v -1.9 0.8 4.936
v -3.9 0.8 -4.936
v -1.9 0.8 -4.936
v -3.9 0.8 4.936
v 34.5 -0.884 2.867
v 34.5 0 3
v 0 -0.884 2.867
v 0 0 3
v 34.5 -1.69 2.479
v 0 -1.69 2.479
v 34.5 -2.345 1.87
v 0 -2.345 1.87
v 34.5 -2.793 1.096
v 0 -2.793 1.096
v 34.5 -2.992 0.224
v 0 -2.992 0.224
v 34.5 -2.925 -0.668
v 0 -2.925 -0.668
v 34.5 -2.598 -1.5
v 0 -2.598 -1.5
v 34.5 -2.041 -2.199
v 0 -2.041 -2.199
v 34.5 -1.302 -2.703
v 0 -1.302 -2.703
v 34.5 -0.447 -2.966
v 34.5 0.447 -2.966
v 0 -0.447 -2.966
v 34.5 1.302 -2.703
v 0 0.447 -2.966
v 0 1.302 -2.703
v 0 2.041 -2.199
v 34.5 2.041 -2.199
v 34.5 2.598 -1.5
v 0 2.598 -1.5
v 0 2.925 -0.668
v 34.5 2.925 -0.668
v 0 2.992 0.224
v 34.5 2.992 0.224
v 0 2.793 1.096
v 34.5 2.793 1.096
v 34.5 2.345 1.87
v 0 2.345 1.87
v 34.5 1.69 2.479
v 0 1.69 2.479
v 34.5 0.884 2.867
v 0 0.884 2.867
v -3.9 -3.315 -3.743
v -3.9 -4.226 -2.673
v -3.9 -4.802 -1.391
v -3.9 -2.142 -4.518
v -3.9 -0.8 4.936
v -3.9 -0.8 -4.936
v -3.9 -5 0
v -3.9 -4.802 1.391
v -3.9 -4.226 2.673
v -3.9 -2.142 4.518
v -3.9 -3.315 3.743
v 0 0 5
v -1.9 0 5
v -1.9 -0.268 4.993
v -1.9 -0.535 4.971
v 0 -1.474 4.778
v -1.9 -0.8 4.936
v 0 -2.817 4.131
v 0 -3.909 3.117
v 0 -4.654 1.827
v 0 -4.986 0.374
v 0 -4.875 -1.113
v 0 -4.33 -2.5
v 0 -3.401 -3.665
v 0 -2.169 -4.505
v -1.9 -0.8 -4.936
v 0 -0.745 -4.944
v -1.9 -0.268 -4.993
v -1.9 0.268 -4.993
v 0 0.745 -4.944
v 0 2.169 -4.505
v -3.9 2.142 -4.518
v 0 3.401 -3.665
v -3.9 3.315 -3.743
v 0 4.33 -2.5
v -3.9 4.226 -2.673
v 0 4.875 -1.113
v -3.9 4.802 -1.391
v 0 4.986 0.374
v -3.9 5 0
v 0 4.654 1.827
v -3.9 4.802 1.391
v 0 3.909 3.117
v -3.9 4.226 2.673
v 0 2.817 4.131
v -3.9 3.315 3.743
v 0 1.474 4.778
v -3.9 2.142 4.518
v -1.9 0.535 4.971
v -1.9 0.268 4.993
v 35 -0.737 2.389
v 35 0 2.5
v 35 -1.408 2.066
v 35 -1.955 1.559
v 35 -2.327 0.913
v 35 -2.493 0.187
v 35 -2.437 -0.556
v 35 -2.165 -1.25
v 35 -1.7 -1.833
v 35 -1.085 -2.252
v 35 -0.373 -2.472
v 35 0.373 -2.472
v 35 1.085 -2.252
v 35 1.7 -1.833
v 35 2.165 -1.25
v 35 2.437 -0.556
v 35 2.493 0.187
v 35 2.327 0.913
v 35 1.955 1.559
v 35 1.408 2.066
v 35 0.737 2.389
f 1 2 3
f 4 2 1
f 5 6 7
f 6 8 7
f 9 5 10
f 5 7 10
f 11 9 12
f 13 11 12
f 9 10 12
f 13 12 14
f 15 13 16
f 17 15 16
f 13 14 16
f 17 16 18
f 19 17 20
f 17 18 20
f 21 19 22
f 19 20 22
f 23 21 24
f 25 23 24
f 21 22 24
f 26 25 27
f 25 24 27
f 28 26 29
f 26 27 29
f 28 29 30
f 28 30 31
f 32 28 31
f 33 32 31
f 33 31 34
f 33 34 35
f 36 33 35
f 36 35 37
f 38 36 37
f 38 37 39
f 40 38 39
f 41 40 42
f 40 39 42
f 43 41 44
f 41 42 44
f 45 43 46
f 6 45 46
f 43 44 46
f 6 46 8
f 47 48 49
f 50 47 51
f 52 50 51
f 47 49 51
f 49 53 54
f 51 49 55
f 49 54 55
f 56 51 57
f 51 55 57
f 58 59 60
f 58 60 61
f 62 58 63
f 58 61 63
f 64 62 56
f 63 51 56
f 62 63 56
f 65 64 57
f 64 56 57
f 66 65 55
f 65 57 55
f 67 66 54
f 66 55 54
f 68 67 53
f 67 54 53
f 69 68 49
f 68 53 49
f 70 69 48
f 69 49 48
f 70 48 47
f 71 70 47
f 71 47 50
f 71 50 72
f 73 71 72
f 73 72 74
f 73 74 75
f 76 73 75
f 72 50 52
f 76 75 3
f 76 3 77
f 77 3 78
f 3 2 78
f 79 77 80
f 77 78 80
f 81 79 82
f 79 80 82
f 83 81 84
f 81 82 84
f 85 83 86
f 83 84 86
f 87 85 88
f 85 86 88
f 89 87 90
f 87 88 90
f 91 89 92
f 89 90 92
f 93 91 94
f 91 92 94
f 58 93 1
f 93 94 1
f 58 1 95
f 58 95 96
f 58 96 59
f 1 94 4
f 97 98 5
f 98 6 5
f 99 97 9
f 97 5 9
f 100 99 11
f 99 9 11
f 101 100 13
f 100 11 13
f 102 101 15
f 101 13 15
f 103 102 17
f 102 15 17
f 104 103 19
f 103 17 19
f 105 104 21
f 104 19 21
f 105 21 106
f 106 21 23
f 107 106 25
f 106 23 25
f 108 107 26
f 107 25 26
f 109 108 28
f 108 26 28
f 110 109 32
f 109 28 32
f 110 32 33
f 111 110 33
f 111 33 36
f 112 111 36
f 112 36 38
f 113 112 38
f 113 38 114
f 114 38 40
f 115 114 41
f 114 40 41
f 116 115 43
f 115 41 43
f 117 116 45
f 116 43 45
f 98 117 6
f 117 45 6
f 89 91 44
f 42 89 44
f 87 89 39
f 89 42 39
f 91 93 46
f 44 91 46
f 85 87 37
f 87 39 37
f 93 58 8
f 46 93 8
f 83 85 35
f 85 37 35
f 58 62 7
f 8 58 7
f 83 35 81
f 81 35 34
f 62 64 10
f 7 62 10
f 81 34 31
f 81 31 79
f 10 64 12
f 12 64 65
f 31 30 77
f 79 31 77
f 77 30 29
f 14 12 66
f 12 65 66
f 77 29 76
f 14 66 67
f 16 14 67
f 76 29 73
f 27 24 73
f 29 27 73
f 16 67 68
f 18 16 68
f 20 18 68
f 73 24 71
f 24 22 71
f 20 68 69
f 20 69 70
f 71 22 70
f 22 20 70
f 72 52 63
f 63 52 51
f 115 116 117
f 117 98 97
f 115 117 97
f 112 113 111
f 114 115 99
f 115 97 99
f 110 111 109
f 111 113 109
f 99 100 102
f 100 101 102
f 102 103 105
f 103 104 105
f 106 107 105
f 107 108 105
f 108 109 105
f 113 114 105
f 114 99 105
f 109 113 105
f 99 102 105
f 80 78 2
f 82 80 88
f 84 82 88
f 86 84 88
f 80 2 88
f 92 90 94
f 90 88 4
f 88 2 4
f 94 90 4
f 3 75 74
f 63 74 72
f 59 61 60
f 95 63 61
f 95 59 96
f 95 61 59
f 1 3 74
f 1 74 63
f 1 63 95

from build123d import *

# Parameters (mm, degrees)
ESQUISSE2_W             = 12
ESQUISSE2_H             = 1.6
ENL_V_MAT_EXTRU_1_DEPTH = 2


with BuildPart() as part:
    # Esquisse1 → Révolution1 (revolve)
    with BuildSketch(Plane.XY, mode=Mode.PRIVATE) as r_volution1_sk:
        Polygon((0, 3), (0, 5), (-3.9, 5), (-3.9, 0), (35, 0), (35, 2.5), (34.5, 3), align=None)
    revolve(r_volution1_sk.sketch.rotate(Axis((-3.9, 0, 0), (1, 0, 0)), 90), axis=Axis((-3.9, 0, 0), (1, 0, 0)))  # turned: the seam where the file's is

    # Esquisse2 → Enlèv. mat.-Extru.1 (cut)
    with BuildSketch(Plane.ZY.offset(3.9)):
        Rectangle(ESQUISSE2_W, ESQUISSE2_H)
    extrude(amount=-ENL_V_MAT_EXTRU_1_DEPTH, mode=Mode.SUBTRACT)


solid = part.part
